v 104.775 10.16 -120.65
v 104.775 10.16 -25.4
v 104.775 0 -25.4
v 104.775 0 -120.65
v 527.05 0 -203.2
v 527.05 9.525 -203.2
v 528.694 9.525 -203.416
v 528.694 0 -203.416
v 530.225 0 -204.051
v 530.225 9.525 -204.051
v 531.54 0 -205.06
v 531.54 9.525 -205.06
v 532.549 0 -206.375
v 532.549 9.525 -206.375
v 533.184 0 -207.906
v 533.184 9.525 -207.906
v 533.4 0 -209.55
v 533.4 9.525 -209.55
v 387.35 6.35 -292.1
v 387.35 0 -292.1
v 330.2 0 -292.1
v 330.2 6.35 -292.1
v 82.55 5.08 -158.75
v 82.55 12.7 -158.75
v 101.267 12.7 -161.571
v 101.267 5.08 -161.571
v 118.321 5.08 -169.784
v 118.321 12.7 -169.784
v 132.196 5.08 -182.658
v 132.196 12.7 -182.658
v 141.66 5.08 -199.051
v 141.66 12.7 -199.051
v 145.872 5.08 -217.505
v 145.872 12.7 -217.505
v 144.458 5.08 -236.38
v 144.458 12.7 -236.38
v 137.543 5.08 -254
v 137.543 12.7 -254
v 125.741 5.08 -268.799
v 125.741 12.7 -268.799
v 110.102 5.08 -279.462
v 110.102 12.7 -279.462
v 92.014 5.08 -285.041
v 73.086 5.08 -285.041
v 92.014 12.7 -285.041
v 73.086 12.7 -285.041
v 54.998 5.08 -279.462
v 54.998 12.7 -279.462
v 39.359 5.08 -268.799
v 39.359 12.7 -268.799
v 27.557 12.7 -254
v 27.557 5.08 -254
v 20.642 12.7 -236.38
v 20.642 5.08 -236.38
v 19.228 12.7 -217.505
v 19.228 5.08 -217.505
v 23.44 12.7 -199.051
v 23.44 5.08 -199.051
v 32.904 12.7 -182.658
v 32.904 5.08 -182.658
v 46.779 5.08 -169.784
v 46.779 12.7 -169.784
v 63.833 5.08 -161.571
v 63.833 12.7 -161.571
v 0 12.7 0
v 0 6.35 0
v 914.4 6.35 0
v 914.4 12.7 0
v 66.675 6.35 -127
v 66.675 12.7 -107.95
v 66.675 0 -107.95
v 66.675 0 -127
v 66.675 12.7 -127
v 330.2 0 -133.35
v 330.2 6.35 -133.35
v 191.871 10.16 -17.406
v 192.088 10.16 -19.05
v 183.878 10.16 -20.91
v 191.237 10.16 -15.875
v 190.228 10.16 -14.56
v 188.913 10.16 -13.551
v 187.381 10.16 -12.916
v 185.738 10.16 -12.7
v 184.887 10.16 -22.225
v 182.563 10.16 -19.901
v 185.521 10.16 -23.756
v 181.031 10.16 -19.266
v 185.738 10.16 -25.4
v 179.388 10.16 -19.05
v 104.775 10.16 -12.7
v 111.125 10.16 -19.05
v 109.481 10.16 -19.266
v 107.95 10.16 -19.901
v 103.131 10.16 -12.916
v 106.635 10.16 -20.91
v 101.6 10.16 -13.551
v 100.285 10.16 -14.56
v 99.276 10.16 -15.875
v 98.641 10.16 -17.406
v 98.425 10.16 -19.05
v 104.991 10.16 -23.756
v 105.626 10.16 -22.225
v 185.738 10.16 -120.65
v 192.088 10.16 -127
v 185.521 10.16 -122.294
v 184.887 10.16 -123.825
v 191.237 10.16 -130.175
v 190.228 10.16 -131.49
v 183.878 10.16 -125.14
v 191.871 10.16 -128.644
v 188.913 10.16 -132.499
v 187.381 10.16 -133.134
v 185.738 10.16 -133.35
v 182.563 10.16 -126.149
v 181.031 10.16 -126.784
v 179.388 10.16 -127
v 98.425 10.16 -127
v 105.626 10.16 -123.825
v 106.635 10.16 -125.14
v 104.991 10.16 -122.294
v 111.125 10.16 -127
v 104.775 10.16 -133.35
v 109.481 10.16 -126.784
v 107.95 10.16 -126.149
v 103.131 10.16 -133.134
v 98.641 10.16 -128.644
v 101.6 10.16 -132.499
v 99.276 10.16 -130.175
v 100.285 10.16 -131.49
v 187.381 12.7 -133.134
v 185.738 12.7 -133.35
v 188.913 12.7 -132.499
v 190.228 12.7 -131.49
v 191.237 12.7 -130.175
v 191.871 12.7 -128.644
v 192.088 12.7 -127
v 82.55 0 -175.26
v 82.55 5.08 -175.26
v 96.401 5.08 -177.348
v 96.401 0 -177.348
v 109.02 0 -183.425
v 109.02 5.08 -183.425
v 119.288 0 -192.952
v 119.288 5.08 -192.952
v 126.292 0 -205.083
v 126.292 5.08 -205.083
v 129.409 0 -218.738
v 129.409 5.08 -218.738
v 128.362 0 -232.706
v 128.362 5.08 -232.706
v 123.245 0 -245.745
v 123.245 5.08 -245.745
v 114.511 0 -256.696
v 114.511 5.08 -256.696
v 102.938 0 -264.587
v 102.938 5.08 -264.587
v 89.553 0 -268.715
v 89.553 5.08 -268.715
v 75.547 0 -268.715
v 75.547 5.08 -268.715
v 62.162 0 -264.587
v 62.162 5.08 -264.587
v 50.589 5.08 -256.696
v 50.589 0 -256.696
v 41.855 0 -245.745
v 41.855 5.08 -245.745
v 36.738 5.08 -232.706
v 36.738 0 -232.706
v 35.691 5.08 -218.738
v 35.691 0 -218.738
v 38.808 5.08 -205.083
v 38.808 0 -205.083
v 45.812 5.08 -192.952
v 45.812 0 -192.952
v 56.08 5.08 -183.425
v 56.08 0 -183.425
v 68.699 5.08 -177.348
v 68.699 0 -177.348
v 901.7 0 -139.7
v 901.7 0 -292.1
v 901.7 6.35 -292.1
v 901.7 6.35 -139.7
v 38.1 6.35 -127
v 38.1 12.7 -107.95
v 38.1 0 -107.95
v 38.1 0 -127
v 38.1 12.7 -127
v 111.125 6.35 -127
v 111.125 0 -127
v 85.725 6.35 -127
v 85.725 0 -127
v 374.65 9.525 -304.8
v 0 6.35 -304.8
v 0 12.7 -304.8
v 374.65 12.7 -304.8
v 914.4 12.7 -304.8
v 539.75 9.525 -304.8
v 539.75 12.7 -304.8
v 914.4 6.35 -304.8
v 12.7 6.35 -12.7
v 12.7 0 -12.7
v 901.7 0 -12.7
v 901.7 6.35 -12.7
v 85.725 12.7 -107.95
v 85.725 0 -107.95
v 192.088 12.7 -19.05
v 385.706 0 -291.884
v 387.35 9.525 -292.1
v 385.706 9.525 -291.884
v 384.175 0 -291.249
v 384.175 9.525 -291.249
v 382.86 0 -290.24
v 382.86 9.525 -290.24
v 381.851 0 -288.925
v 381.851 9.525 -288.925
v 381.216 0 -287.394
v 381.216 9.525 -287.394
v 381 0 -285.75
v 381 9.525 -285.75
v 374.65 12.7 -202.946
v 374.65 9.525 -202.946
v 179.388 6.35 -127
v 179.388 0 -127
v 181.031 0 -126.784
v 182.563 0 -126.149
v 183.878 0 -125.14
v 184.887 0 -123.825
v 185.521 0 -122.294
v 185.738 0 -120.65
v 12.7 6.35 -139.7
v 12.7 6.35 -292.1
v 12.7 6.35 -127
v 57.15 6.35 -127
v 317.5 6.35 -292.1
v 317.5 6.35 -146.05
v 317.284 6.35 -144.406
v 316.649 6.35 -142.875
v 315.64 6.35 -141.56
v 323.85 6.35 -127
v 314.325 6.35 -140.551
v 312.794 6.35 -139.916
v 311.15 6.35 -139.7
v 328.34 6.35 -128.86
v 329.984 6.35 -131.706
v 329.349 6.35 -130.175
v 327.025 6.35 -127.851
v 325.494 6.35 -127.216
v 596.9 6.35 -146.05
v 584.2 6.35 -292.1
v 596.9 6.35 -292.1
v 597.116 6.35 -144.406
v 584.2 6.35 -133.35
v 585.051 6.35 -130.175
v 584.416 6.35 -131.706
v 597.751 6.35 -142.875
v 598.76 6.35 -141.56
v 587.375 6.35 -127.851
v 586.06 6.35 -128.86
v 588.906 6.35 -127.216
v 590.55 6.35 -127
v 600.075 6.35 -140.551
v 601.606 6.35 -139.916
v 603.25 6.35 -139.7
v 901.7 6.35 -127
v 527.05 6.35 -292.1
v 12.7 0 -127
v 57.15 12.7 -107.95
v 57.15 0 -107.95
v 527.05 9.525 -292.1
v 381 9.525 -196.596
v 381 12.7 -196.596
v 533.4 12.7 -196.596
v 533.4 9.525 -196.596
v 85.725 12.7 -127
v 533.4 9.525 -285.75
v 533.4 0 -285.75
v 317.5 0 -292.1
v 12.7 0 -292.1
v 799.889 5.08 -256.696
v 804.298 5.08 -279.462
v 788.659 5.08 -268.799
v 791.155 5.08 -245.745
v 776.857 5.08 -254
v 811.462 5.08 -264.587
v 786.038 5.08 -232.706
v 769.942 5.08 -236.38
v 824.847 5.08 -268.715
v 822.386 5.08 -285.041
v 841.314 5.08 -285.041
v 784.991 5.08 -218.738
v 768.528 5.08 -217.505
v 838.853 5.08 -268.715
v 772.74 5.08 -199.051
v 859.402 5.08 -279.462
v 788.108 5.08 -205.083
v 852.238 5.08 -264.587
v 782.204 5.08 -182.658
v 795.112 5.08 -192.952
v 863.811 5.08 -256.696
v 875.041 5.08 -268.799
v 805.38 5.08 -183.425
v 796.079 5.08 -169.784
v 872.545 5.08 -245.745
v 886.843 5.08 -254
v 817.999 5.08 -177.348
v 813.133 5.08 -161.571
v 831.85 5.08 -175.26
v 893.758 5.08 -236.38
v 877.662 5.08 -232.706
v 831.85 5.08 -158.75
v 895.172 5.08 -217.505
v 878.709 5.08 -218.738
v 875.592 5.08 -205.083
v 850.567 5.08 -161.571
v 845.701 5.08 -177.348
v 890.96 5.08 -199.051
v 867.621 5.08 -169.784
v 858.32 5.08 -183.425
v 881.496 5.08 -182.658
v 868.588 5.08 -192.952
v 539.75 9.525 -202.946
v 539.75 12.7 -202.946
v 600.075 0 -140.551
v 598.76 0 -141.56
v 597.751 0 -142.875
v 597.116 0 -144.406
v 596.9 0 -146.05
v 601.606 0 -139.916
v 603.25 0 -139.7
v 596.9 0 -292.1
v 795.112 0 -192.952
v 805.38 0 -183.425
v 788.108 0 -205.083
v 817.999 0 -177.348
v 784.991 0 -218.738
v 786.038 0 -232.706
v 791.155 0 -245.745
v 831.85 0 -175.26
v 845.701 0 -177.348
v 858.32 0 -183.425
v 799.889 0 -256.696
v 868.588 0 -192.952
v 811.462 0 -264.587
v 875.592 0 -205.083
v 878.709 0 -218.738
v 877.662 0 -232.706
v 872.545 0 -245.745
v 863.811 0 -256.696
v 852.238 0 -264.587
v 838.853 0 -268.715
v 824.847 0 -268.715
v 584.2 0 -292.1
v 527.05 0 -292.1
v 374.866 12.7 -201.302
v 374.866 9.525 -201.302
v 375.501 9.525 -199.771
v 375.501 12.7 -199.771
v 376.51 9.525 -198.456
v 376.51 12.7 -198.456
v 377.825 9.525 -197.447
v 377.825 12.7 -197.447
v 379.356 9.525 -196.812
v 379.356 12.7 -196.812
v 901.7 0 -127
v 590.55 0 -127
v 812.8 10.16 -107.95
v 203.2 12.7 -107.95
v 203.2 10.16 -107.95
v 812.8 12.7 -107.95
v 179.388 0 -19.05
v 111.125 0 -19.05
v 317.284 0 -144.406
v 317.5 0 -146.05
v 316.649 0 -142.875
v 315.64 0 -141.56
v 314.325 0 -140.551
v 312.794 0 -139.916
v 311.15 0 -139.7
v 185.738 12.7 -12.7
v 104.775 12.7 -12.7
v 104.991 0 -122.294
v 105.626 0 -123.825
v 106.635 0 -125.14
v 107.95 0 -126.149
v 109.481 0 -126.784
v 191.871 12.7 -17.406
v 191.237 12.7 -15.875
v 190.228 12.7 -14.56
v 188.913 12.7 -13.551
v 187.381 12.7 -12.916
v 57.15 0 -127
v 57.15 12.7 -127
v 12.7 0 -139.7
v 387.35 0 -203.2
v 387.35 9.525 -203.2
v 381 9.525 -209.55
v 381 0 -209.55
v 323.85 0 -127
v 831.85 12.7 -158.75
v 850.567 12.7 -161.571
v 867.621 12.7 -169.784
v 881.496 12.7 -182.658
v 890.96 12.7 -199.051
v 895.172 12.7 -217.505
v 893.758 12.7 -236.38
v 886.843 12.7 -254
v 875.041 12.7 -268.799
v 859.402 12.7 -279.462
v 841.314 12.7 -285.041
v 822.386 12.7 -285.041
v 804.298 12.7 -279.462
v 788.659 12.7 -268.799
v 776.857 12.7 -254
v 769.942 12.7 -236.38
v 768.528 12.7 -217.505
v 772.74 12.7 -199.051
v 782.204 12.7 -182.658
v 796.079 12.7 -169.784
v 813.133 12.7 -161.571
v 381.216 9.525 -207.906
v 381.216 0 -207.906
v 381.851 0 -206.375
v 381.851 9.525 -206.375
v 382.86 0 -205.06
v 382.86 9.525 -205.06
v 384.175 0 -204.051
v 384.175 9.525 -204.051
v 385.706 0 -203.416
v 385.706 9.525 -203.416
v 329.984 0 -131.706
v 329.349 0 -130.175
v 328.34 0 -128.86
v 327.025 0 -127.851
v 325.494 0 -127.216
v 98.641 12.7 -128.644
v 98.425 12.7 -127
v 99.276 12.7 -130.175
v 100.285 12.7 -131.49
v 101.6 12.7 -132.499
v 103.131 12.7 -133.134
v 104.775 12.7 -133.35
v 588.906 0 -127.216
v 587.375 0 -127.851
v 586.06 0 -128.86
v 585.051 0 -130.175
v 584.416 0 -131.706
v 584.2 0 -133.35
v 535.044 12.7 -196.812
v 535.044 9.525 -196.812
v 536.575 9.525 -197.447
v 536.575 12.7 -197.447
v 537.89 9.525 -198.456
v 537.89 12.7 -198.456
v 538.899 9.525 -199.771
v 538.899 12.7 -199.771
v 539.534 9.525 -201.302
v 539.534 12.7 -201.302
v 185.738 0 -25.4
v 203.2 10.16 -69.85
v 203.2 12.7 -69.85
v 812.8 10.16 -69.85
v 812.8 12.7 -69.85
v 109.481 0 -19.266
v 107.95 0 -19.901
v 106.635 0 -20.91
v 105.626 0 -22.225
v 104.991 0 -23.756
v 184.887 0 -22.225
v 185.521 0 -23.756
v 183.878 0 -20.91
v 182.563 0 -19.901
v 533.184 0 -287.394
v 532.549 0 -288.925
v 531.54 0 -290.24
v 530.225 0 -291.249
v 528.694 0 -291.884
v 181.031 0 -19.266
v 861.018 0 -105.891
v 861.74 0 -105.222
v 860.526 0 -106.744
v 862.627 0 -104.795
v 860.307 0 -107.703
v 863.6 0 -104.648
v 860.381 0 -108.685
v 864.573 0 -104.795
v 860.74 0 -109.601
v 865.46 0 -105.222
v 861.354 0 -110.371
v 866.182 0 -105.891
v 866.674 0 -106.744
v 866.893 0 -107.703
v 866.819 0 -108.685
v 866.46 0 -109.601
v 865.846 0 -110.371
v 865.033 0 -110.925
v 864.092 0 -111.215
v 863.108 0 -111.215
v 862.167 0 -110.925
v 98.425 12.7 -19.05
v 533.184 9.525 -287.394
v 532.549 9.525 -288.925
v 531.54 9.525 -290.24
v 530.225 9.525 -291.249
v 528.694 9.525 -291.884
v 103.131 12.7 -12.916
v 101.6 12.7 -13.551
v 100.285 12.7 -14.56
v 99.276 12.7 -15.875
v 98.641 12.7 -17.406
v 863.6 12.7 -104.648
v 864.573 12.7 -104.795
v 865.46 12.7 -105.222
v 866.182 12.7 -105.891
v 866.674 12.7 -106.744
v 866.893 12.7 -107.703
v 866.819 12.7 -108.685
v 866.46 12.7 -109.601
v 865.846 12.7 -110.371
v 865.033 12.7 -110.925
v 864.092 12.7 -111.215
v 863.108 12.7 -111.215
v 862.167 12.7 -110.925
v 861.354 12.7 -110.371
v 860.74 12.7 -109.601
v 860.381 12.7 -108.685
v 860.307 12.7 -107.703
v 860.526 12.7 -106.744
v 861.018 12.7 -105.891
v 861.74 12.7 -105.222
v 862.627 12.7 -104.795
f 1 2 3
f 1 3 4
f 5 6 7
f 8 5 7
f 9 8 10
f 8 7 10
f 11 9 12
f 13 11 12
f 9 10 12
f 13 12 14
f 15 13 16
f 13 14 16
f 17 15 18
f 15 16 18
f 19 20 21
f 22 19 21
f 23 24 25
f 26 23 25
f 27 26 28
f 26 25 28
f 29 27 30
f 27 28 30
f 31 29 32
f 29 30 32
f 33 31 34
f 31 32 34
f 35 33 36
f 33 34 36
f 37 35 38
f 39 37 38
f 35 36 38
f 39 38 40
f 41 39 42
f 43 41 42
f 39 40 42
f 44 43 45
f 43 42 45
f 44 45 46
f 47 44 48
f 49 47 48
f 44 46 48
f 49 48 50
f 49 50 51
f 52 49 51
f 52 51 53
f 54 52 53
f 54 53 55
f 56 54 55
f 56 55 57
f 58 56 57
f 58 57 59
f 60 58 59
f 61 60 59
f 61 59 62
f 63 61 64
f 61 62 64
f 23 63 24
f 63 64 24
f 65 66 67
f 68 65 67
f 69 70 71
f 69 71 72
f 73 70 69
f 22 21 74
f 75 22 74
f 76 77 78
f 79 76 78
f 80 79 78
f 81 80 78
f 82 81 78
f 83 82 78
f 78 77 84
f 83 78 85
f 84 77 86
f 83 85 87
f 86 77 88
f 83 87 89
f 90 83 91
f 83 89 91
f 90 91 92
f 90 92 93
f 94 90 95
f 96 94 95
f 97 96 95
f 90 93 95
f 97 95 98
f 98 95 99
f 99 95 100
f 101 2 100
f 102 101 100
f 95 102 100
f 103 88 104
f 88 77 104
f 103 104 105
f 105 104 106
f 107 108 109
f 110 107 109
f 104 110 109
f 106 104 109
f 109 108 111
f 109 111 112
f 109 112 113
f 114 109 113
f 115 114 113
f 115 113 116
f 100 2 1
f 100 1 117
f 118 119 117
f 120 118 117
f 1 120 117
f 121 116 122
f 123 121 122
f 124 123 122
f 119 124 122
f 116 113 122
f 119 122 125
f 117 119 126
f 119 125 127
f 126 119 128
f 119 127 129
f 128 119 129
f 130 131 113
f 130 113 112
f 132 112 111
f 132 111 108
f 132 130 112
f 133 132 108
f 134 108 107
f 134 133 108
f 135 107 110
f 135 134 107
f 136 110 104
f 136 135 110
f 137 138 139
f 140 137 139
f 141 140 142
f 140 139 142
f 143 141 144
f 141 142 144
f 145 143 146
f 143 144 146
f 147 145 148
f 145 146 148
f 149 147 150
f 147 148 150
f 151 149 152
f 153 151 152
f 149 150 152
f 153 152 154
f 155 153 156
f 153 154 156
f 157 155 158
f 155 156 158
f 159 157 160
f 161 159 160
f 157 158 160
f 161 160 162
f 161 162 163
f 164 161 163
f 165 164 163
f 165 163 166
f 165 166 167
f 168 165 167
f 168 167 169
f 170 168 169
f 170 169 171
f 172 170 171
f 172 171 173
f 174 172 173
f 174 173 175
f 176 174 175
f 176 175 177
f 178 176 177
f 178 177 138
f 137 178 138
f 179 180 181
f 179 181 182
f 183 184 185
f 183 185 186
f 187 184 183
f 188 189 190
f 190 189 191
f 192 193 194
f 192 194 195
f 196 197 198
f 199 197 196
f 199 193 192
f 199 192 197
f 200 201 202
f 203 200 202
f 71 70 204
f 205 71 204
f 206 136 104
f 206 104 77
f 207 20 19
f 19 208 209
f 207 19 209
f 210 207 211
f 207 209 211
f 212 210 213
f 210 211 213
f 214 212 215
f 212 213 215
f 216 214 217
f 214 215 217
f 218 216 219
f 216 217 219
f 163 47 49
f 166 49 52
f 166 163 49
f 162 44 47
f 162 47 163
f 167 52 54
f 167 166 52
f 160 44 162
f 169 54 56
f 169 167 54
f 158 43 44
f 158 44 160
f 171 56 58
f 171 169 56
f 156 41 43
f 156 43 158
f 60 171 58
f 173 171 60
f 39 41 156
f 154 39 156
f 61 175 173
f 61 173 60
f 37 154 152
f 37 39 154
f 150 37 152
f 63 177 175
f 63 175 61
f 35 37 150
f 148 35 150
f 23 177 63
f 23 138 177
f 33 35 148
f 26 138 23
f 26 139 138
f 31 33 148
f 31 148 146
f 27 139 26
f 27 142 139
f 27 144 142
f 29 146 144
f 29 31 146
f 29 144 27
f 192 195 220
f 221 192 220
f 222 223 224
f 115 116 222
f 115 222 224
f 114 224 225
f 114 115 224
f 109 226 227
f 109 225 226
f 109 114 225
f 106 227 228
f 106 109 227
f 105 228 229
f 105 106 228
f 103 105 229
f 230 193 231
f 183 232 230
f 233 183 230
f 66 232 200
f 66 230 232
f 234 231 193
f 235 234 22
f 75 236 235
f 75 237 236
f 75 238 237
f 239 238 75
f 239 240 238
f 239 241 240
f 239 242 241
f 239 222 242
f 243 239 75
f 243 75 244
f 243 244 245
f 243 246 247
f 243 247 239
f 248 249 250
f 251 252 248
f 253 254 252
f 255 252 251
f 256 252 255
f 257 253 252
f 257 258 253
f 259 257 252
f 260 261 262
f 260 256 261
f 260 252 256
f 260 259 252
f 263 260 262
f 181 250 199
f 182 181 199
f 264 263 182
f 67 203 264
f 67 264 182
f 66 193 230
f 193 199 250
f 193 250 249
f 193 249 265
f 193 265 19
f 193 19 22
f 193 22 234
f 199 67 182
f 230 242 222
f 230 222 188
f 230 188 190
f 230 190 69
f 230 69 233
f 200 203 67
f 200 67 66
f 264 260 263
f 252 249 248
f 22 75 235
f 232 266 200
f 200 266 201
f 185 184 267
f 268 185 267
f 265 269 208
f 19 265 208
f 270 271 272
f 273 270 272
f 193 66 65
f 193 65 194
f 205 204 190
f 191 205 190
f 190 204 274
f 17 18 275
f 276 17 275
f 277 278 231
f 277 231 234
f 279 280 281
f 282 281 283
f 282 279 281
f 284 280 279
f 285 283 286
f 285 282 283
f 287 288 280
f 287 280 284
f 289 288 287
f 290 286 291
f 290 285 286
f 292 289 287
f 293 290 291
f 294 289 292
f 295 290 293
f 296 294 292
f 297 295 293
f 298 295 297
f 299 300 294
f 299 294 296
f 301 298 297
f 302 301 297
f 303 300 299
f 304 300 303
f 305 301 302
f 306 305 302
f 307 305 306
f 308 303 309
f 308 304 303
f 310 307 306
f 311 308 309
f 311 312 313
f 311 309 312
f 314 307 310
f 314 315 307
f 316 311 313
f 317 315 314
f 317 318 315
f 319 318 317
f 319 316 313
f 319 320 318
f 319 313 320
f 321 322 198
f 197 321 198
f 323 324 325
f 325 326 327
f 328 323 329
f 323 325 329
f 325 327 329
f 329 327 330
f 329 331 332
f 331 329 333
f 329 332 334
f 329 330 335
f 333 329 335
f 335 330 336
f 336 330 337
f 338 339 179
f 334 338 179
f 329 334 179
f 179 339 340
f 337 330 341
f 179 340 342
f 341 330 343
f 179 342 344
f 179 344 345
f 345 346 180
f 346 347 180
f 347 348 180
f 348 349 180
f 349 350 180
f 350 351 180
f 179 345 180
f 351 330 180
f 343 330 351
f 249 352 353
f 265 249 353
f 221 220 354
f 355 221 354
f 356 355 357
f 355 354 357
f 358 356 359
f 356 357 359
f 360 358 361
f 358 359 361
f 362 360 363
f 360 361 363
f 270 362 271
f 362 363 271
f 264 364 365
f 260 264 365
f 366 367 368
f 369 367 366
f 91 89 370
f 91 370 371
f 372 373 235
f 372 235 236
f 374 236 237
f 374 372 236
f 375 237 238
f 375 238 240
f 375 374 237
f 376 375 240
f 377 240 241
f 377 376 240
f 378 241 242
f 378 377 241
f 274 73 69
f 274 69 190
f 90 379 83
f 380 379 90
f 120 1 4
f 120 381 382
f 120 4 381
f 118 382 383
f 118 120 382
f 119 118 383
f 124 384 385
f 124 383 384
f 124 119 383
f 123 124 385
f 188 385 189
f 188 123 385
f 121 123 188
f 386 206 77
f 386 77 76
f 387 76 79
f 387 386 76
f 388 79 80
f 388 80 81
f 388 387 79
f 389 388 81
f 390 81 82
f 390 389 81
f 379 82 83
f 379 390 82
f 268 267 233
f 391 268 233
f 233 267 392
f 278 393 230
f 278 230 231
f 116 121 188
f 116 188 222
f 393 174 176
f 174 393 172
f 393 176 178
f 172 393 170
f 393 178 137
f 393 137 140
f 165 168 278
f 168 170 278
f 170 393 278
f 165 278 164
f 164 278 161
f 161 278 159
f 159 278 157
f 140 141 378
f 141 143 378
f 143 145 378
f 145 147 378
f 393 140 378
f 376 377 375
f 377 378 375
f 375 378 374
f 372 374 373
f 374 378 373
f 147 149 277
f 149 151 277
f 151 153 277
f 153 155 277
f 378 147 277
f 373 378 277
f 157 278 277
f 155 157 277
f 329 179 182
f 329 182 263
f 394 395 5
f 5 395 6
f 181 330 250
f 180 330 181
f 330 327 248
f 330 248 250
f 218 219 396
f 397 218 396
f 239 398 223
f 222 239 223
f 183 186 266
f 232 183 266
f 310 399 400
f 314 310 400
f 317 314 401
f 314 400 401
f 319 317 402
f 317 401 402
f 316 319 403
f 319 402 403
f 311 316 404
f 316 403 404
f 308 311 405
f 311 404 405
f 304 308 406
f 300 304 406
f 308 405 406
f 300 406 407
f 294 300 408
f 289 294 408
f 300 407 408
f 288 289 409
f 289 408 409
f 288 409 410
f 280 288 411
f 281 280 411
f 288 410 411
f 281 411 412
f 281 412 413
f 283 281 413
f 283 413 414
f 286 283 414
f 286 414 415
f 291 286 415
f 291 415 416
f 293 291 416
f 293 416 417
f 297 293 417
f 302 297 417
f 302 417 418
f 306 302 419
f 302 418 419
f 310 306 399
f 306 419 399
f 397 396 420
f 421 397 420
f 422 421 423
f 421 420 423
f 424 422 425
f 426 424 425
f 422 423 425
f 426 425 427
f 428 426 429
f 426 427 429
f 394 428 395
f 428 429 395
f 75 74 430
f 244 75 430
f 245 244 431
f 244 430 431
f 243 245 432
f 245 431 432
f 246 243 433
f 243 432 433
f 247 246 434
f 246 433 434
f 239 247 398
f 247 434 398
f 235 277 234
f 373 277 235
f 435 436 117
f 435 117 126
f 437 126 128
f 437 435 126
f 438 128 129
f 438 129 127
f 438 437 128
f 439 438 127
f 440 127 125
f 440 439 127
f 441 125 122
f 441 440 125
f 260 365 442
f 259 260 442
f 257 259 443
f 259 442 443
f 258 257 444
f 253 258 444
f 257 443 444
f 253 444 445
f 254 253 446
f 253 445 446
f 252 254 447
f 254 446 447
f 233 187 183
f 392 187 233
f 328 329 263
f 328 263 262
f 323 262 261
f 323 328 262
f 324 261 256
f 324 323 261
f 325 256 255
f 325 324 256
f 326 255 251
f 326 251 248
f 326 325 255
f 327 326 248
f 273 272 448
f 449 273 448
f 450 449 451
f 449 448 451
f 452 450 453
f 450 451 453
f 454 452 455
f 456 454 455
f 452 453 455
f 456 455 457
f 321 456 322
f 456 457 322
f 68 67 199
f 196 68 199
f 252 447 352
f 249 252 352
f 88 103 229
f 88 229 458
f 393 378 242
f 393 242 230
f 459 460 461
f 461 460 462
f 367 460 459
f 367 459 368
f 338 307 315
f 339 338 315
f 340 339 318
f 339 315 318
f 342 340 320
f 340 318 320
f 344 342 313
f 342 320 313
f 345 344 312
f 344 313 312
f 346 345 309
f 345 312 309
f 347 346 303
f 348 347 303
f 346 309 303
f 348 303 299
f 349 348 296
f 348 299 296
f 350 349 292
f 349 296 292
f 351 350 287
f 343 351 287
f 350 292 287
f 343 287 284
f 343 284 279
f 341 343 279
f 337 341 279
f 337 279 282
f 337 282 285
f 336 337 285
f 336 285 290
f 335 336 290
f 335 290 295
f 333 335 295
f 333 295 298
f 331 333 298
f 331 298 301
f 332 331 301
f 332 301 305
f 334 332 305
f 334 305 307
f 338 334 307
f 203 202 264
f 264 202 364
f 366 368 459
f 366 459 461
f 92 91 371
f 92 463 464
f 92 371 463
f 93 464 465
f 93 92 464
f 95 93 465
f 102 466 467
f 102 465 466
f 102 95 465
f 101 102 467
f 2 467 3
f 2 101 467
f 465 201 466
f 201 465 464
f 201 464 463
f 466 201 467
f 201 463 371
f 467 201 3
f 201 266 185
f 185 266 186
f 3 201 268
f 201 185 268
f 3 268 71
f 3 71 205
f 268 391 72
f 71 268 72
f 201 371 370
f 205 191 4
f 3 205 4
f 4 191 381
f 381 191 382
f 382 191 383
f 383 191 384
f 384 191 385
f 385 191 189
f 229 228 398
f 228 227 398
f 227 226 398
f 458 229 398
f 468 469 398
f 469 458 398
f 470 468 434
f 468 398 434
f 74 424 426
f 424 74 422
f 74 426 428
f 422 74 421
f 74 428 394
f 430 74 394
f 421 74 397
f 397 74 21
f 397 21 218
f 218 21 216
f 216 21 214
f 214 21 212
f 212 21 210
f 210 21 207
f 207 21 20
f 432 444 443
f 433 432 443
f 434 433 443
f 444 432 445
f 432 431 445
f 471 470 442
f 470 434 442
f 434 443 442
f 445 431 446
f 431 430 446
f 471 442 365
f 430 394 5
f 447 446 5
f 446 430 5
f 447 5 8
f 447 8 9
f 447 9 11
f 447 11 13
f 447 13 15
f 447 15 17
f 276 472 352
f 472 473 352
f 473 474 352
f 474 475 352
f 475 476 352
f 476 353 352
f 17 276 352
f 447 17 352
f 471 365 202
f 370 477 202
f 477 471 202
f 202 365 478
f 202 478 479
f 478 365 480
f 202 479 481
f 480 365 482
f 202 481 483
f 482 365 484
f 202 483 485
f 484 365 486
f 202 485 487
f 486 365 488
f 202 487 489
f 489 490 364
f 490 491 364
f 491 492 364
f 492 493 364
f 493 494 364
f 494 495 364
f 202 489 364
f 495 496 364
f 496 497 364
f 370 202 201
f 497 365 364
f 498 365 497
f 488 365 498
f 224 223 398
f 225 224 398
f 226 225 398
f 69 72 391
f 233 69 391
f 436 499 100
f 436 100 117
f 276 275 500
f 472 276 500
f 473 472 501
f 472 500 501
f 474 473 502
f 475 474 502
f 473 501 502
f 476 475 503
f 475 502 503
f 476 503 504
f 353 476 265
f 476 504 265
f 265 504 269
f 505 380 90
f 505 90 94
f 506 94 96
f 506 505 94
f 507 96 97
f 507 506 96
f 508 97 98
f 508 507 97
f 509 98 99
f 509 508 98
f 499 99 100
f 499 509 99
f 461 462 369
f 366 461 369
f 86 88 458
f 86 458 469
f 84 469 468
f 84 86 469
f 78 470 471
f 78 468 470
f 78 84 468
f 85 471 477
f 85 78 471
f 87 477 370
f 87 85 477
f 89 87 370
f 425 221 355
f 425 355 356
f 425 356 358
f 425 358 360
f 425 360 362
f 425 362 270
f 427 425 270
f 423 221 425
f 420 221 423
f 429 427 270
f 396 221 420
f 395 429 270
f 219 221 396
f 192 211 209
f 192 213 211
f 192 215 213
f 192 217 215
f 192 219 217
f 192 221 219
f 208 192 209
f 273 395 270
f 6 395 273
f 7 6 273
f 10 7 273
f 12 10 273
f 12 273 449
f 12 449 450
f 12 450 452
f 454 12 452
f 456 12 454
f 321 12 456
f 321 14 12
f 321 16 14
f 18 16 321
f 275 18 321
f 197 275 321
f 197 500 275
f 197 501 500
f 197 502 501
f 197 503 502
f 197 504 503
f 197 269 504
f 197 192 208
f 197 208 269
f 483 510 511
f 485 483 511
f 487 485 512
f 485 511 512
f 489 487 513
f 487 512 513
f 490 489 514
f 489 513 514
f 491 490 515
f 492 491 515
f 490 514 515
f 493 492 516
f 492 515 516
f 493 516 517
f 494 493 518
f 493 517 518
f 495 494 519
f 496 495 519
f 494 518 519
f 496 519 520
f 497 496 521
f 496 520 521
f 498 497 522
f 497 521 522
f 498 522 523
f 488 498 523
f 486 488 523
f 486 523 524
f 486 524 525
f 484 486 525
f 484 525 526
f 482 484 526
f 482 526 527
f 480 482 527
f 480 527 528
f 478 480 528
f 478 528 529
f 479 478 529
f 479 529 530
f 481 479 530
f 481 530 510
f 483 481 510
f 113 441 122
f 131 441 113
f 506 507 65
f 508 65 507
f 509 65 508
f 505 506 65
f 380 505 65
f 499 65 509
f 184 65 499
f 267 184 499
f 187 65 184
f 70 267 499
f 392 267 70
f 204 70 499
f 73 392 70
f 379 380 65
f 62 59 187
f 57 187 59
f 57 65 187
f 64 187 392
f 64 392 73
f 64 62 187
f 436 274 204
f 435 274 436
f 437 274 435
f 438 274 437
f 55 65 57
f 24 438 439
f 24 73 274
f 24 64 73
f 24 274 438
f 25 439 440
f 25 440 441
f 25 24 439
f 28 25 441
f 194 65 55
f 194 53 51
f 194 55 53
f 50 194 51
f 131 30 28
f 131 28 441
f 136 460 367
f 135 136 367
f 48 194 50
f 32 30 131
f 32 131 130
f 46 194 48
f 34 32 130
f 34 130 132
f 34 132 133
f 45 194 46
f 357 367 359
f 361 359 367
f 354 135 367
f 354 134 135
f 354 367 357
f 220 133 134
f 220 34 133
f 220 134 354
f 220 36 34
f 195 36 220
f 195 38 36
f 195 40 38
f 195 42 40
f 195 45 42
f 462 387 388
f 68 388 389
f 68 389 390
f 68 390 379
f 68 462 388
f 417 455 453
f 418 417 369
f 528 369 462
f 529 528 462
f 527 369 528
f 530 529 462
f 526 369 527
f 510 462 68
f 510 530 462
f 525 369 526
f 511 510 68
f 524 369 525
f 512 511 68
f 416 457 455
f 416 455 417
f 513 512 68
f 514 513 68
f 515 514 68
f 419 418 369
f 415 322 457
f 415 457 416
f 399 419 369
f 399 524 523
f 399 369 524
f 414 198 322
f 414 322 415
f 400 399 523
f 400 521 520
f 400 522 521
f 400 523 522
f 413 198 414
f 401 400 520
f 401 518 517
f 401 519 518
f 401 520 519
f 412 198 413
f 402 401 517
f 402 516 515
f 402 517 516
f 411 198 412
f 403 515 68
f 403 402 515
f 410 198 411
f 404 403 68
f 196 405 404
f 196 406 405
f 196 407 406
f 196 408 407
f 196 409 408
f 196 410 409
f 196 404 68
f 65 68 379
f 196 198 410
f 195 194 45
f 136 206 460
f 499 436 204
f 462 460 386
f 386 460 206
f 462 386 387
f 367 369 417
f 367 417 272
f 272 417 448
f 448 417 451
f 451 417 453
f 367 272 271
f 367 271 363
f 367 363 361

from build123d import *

# Parameters (mm, degrees)
SKETCH1_W           = 914.4
SKETCH1_H           = 304.8
BOSS_EXTRUDE1_DEPTH = 12.7
SKETCH5_W           = 609.6
SKETCH5_H           = 38.1
CUT_EXTRUDE3_DEPTH  = 2.54
SKETCH6_R           = 46.99
CUT_EXTRUDE4_DEPTH  = 964.945895785
SKETCH7_R           = 63.5
CUT_EXTRUDE5_DEPTH  = 7.62
CUT_EXTRUDE6_DEPTH  = 964.945895785
CUT_EXTRUDE7_DEPTH  = 3.175
SKETCH13_W          = 19.05
SKETCH13_H          = 19.05
CUT_EXTRUDE11_DEPTH = 964.945895785
CUT_EXTRUDE19_DEPTH = 964.945895785
CUT_EXTRUDE20_DEPTH = 2.54
SKETCH26_R          = 3.302
CUT_EXTRUDE21_DEPTH = 964.945895785
SKETCH19_W          = 914.4
SKETCH19_H          = 304.8
CUT_EXTRUDE16_DEPTH = 6.35


with BuildPart() as part:
    # Sketch1 → Boss-Extrude1 (new body)
    with BuildSketch(Plane(origin=(0, 0, 0), x_dir=(1, 0, 0), z_dir=(0, 1, 0))):
        with Locations((457.2, 152.4)):
            Rectangle(SKETCH1_W, SKETCH1_H)
    extrude(amount=BOSS_EXTRUDE1_DEPTH)

    # Sketch5 → Cut-Extrude3 (cut)
    with BuildSketch(Plane(origin=(0, 12.7, 0), x_dir=(1, 0, 0), z_dir=(0, 1, 0))):
        with Locations((508, 88.9)):
            Rectangle(SKETCH5_W, SKETCH5_H)
    extrude(amount=-CUT_EXTRUDE3_DEPTH, mode=Mode.SUBTRACT)

    # Sketch6 → Cut-Extrude4 (cut, through all)
    with BuildSketch(Plane(origin=(0, 12.7, 0), x_dir=(1, 0, 0), z_dir=(0, 1, 0))):
        with Locations(Location((82.55, 222.25, 0), (0, 0, 270))):
            Circle(SKETCH6_R)
        with Locations(Location((831.85, 222.25, 0), (0, 0, 270))):
            Circle(SKETCH6_R)
    extrude(amount=-CUT_EXTRUDE4_DEPTH, mode=Mode.SUBTRACT)

    # Sketch7 → Cut-Extrude5 (cut)
    with BuildSketch(Plane(origin=(0, 12.7, 0), x_dir=(1, 0, 0), z_dir=(0, 1, 0))):
        with Locations(Location((82.55, 222.25, 0), (0, 0, 270))):
            Circle(SKETCH7_R)
        with Locations(Location((831.85, 222.25, 0), (0, 0, 270))):
            Circle(SKETCH7_R)
    extrude(amount=-CUT_EXTRUDE5_DEPTH, mode=Mode.SUBTRACT)

    # Sketch8 → Cut-Extrude6 (cut, through all)
    with BuildSketch(Plane(origin=(0, 12.7, 0), x_dir=(1, 0, 0), z_dir=(0, 1, 0))):
        with BuildLine():
            Line((381, 285.75), (381, 209.55))
            ThreePointArc((381, 209.55), (382.859871939, 205.059871939), (387.35, 203.2))
            Line((387.35, 203.2), (527.05, 203.2))
            ThreePointArc((527.05, 203.2), (531.540128061, 205.059871939), (533.4, 209.55))
            Line((533.4, 209.55), (533.4, 285.75))
            ThreePointArc((533.4, 285.75), (531.540128061, 290.240128061), (527.05, 292.1))
            Line((527.05, 292.1), (387.35, 292.1))
            ThreePointArc((387.35, 292.1), (382.859871939, 290.240128061), (381, 285.75))
        make_face()
    extrude(amount=-CUT_EXTRUDE6_DEPTH, mode=Mode.SUBTRACT)

    # Sketch9 → Cut-Extrude7 (cut)
    with BuildSketch(Plane(origin=(0, 12.7, 0), x_dir=(1, 0, 0), z_dir=(0, 1, 0))):
        with BuildLine():
            Line((539.75, 304.8), (374.65, 304.8))
            Line((374.65, 304.8), (374.65, 202.946))
            ThreePointArc((374.65, 202.946), (376.509871939, 198.455871939), (381, 196.596))
            Line((381, 196.596), (533.4, 196.596))
            ThreePointArc((533.4, 196.596), (537.890128061, 198.455871939), (539.75, 202.946))
            Line((539.75, 202.946), (539.75, 304.8))
        make_face()
    extrude(amount=-CUT_EXTRUDE7_DEPTH, mode=Mode.SUBTRACT)

    # Sketch13 → Cut-Extrude11 (cut, through all)
    with BuildSketch(Plane(origin=(0, 12.7, 0), x_dir=(1, 0, 0), z_dir=(0, 1, 0))):
        with Locations((47.625, 117.475)):
            Rectangle(SKETCH13_W, SKETCH13_H)
        with Locations((76.2, 117.475)):
            Rectangle(SKETCH13_W, SKETCH13_H)
    extrude(amount=-CUT_EXTRUDE11_DEPTH, mode=Mode.SUBTRACT)

    # Sketch24 → Cut-Extrude19 (cut, through all)
    with BuildSketch(Plane(origin=(0, 12.7, 0), x_dir=(1, 0, 0), z_dir=(0, 1, 0))):
        with BuildLine():
            Line((111.125, 127), (179.3875, 127))
            ThreePointArc((179.3875, 127), (183.877628061, 125.140128061), (185.7375, 120.65))
            Line((185.7375, 120.65), (185.7375, 25.4))
            ThreePointArc((185.7375, 25.4), (183.877628061, 20.909871939), (179.3875, 19.05))
            Line((179.3875, 19.05), (111.125, 19.05))
            ThreePointArc((111.125, 19.05), (106.634871939, 20.909871939), (104.775, 25.4))
            Line((104.775, 25.4), (104.775, 120.65))
            ThreePointArc((104.775, 120.65), (106.634871939, 125.140128061), (111.125, 127))
        make_face()
    extrude(amount=-CUT_EXTRUDE19_DEPTH, mode=Mode.SUBTRACT)

    # Sketch25 → Cut-Extrude20 (cut)
    with BuildSketch(Plane(origin=(0, 12.7, 0), x_dir=(1, 0, 0), z_dir=(0, 1, 0))):
        with BuildLine():
            Line((104.775, 133.35), (185.7375, 133.35))
            ThreePointArc((185.7375, 133.35), (190.227628061, 131.490128061), (192.0875, 127))
            Line((192.0875, 127), (192.0875, 19.05))
            ThreePointArc((192.0875, 19.05), (190.227628061, 14.559871939), (185.7375, 12.7))
            Line((185.7375, 12.7), (104.775, 12.7))
            ThreePointArc((104.775, 12.7), (100.284871939, 14.559871939), (98.425, 19.05))
            Line((98.425, 19.05), (98.425, 127))
            ThreePointArc((98.425, 127), (100.284871939, 131.490128061), (104.775, 133.35))
        make_face()
    extrude(amount=-CUT_EXTRUDE20_DEPTH, mode=Mode.SUBTRACT)

    # Sketch26 → Cut-Extrude21 (cut, through all)
    with BuildSketch(Plane(origin=(0, 12.7, 0), x_dir=(1, 0, 0), z_dir=(0, 1, 0))):
        with Locations(Location((863.6, 107.95, 0), (0, 0, 270))):
            Circle(SKETCH26_R)
    extrude(amount=-CUT_EXTRUDE21_DEPTH, mode=Mode.SUBTRACT)

    # Sketch19 → Cut-Extrude16 (cut)
    with BuildSketch(Plane.XZ):
        with Locations((457.2, -152.4)):
            Rectangle(SKETCH19_W, SKETCH19_H)
        with BuildLine():
            Line((12.7, -139.7), (12.7, -292.1))
            Line((12.7, -292.1), (317.5, -292.1))
            Line((317.5, -292.1), (317.5, -146.05))
            ThreePointArc((317.5, -146.05), (315.640128061, -141.559871939), (311.15, -139.7))
            Line((311.15, -139.7), (12.7, -139.7))
        make_face(mode=Mode.SUBTRACT)
        with BuildLine():
            Line((596.9, -292.1), (901.7, -292.1))
            Line((901.7, -292.1), (901.7, -139.7))
            Line((901.7, -139.7), (603.25, -139.7))
            ThreePointArc((603.25, -139.7), (598.759871939, -141.559871939), (596.9, -146.05))
            Line((596.9, -146.05), (596.9, -292.1))
        make_face(mode=Mode.SUBTRACT)
        with BuildLine():
            Line((12.7, -127), (12.7, -12.7))
            Line((12.7, -12.7), (901.7, -12.7))
            Line((901.7, -12.7), (901.7, -127))
            Line((901.7, -127), (590.55, -127))
            ThreePointArc((590.55, -127), (586.059871939, -128.859871939), (584.2, -133.35))
            Line((584.2, -133.35), (584.2, -292.1))
            Line((584.2, -292.1), (330.2, -292.1))
            Line((330.2, -292.1), (330.2, -133.35))
            ThreePointArc((330.2, -133.35), (328.340128061, -128.859871939), (323.85, -127))
            Line((323.85, -127), (12.7, -127))
        make_face(mode=Mode.SUBTRACT)
    extrude(amount=-CUT_EXTRUDE16_DEPTH, mode=Mode.SUBTRACT)


solid = part.part
